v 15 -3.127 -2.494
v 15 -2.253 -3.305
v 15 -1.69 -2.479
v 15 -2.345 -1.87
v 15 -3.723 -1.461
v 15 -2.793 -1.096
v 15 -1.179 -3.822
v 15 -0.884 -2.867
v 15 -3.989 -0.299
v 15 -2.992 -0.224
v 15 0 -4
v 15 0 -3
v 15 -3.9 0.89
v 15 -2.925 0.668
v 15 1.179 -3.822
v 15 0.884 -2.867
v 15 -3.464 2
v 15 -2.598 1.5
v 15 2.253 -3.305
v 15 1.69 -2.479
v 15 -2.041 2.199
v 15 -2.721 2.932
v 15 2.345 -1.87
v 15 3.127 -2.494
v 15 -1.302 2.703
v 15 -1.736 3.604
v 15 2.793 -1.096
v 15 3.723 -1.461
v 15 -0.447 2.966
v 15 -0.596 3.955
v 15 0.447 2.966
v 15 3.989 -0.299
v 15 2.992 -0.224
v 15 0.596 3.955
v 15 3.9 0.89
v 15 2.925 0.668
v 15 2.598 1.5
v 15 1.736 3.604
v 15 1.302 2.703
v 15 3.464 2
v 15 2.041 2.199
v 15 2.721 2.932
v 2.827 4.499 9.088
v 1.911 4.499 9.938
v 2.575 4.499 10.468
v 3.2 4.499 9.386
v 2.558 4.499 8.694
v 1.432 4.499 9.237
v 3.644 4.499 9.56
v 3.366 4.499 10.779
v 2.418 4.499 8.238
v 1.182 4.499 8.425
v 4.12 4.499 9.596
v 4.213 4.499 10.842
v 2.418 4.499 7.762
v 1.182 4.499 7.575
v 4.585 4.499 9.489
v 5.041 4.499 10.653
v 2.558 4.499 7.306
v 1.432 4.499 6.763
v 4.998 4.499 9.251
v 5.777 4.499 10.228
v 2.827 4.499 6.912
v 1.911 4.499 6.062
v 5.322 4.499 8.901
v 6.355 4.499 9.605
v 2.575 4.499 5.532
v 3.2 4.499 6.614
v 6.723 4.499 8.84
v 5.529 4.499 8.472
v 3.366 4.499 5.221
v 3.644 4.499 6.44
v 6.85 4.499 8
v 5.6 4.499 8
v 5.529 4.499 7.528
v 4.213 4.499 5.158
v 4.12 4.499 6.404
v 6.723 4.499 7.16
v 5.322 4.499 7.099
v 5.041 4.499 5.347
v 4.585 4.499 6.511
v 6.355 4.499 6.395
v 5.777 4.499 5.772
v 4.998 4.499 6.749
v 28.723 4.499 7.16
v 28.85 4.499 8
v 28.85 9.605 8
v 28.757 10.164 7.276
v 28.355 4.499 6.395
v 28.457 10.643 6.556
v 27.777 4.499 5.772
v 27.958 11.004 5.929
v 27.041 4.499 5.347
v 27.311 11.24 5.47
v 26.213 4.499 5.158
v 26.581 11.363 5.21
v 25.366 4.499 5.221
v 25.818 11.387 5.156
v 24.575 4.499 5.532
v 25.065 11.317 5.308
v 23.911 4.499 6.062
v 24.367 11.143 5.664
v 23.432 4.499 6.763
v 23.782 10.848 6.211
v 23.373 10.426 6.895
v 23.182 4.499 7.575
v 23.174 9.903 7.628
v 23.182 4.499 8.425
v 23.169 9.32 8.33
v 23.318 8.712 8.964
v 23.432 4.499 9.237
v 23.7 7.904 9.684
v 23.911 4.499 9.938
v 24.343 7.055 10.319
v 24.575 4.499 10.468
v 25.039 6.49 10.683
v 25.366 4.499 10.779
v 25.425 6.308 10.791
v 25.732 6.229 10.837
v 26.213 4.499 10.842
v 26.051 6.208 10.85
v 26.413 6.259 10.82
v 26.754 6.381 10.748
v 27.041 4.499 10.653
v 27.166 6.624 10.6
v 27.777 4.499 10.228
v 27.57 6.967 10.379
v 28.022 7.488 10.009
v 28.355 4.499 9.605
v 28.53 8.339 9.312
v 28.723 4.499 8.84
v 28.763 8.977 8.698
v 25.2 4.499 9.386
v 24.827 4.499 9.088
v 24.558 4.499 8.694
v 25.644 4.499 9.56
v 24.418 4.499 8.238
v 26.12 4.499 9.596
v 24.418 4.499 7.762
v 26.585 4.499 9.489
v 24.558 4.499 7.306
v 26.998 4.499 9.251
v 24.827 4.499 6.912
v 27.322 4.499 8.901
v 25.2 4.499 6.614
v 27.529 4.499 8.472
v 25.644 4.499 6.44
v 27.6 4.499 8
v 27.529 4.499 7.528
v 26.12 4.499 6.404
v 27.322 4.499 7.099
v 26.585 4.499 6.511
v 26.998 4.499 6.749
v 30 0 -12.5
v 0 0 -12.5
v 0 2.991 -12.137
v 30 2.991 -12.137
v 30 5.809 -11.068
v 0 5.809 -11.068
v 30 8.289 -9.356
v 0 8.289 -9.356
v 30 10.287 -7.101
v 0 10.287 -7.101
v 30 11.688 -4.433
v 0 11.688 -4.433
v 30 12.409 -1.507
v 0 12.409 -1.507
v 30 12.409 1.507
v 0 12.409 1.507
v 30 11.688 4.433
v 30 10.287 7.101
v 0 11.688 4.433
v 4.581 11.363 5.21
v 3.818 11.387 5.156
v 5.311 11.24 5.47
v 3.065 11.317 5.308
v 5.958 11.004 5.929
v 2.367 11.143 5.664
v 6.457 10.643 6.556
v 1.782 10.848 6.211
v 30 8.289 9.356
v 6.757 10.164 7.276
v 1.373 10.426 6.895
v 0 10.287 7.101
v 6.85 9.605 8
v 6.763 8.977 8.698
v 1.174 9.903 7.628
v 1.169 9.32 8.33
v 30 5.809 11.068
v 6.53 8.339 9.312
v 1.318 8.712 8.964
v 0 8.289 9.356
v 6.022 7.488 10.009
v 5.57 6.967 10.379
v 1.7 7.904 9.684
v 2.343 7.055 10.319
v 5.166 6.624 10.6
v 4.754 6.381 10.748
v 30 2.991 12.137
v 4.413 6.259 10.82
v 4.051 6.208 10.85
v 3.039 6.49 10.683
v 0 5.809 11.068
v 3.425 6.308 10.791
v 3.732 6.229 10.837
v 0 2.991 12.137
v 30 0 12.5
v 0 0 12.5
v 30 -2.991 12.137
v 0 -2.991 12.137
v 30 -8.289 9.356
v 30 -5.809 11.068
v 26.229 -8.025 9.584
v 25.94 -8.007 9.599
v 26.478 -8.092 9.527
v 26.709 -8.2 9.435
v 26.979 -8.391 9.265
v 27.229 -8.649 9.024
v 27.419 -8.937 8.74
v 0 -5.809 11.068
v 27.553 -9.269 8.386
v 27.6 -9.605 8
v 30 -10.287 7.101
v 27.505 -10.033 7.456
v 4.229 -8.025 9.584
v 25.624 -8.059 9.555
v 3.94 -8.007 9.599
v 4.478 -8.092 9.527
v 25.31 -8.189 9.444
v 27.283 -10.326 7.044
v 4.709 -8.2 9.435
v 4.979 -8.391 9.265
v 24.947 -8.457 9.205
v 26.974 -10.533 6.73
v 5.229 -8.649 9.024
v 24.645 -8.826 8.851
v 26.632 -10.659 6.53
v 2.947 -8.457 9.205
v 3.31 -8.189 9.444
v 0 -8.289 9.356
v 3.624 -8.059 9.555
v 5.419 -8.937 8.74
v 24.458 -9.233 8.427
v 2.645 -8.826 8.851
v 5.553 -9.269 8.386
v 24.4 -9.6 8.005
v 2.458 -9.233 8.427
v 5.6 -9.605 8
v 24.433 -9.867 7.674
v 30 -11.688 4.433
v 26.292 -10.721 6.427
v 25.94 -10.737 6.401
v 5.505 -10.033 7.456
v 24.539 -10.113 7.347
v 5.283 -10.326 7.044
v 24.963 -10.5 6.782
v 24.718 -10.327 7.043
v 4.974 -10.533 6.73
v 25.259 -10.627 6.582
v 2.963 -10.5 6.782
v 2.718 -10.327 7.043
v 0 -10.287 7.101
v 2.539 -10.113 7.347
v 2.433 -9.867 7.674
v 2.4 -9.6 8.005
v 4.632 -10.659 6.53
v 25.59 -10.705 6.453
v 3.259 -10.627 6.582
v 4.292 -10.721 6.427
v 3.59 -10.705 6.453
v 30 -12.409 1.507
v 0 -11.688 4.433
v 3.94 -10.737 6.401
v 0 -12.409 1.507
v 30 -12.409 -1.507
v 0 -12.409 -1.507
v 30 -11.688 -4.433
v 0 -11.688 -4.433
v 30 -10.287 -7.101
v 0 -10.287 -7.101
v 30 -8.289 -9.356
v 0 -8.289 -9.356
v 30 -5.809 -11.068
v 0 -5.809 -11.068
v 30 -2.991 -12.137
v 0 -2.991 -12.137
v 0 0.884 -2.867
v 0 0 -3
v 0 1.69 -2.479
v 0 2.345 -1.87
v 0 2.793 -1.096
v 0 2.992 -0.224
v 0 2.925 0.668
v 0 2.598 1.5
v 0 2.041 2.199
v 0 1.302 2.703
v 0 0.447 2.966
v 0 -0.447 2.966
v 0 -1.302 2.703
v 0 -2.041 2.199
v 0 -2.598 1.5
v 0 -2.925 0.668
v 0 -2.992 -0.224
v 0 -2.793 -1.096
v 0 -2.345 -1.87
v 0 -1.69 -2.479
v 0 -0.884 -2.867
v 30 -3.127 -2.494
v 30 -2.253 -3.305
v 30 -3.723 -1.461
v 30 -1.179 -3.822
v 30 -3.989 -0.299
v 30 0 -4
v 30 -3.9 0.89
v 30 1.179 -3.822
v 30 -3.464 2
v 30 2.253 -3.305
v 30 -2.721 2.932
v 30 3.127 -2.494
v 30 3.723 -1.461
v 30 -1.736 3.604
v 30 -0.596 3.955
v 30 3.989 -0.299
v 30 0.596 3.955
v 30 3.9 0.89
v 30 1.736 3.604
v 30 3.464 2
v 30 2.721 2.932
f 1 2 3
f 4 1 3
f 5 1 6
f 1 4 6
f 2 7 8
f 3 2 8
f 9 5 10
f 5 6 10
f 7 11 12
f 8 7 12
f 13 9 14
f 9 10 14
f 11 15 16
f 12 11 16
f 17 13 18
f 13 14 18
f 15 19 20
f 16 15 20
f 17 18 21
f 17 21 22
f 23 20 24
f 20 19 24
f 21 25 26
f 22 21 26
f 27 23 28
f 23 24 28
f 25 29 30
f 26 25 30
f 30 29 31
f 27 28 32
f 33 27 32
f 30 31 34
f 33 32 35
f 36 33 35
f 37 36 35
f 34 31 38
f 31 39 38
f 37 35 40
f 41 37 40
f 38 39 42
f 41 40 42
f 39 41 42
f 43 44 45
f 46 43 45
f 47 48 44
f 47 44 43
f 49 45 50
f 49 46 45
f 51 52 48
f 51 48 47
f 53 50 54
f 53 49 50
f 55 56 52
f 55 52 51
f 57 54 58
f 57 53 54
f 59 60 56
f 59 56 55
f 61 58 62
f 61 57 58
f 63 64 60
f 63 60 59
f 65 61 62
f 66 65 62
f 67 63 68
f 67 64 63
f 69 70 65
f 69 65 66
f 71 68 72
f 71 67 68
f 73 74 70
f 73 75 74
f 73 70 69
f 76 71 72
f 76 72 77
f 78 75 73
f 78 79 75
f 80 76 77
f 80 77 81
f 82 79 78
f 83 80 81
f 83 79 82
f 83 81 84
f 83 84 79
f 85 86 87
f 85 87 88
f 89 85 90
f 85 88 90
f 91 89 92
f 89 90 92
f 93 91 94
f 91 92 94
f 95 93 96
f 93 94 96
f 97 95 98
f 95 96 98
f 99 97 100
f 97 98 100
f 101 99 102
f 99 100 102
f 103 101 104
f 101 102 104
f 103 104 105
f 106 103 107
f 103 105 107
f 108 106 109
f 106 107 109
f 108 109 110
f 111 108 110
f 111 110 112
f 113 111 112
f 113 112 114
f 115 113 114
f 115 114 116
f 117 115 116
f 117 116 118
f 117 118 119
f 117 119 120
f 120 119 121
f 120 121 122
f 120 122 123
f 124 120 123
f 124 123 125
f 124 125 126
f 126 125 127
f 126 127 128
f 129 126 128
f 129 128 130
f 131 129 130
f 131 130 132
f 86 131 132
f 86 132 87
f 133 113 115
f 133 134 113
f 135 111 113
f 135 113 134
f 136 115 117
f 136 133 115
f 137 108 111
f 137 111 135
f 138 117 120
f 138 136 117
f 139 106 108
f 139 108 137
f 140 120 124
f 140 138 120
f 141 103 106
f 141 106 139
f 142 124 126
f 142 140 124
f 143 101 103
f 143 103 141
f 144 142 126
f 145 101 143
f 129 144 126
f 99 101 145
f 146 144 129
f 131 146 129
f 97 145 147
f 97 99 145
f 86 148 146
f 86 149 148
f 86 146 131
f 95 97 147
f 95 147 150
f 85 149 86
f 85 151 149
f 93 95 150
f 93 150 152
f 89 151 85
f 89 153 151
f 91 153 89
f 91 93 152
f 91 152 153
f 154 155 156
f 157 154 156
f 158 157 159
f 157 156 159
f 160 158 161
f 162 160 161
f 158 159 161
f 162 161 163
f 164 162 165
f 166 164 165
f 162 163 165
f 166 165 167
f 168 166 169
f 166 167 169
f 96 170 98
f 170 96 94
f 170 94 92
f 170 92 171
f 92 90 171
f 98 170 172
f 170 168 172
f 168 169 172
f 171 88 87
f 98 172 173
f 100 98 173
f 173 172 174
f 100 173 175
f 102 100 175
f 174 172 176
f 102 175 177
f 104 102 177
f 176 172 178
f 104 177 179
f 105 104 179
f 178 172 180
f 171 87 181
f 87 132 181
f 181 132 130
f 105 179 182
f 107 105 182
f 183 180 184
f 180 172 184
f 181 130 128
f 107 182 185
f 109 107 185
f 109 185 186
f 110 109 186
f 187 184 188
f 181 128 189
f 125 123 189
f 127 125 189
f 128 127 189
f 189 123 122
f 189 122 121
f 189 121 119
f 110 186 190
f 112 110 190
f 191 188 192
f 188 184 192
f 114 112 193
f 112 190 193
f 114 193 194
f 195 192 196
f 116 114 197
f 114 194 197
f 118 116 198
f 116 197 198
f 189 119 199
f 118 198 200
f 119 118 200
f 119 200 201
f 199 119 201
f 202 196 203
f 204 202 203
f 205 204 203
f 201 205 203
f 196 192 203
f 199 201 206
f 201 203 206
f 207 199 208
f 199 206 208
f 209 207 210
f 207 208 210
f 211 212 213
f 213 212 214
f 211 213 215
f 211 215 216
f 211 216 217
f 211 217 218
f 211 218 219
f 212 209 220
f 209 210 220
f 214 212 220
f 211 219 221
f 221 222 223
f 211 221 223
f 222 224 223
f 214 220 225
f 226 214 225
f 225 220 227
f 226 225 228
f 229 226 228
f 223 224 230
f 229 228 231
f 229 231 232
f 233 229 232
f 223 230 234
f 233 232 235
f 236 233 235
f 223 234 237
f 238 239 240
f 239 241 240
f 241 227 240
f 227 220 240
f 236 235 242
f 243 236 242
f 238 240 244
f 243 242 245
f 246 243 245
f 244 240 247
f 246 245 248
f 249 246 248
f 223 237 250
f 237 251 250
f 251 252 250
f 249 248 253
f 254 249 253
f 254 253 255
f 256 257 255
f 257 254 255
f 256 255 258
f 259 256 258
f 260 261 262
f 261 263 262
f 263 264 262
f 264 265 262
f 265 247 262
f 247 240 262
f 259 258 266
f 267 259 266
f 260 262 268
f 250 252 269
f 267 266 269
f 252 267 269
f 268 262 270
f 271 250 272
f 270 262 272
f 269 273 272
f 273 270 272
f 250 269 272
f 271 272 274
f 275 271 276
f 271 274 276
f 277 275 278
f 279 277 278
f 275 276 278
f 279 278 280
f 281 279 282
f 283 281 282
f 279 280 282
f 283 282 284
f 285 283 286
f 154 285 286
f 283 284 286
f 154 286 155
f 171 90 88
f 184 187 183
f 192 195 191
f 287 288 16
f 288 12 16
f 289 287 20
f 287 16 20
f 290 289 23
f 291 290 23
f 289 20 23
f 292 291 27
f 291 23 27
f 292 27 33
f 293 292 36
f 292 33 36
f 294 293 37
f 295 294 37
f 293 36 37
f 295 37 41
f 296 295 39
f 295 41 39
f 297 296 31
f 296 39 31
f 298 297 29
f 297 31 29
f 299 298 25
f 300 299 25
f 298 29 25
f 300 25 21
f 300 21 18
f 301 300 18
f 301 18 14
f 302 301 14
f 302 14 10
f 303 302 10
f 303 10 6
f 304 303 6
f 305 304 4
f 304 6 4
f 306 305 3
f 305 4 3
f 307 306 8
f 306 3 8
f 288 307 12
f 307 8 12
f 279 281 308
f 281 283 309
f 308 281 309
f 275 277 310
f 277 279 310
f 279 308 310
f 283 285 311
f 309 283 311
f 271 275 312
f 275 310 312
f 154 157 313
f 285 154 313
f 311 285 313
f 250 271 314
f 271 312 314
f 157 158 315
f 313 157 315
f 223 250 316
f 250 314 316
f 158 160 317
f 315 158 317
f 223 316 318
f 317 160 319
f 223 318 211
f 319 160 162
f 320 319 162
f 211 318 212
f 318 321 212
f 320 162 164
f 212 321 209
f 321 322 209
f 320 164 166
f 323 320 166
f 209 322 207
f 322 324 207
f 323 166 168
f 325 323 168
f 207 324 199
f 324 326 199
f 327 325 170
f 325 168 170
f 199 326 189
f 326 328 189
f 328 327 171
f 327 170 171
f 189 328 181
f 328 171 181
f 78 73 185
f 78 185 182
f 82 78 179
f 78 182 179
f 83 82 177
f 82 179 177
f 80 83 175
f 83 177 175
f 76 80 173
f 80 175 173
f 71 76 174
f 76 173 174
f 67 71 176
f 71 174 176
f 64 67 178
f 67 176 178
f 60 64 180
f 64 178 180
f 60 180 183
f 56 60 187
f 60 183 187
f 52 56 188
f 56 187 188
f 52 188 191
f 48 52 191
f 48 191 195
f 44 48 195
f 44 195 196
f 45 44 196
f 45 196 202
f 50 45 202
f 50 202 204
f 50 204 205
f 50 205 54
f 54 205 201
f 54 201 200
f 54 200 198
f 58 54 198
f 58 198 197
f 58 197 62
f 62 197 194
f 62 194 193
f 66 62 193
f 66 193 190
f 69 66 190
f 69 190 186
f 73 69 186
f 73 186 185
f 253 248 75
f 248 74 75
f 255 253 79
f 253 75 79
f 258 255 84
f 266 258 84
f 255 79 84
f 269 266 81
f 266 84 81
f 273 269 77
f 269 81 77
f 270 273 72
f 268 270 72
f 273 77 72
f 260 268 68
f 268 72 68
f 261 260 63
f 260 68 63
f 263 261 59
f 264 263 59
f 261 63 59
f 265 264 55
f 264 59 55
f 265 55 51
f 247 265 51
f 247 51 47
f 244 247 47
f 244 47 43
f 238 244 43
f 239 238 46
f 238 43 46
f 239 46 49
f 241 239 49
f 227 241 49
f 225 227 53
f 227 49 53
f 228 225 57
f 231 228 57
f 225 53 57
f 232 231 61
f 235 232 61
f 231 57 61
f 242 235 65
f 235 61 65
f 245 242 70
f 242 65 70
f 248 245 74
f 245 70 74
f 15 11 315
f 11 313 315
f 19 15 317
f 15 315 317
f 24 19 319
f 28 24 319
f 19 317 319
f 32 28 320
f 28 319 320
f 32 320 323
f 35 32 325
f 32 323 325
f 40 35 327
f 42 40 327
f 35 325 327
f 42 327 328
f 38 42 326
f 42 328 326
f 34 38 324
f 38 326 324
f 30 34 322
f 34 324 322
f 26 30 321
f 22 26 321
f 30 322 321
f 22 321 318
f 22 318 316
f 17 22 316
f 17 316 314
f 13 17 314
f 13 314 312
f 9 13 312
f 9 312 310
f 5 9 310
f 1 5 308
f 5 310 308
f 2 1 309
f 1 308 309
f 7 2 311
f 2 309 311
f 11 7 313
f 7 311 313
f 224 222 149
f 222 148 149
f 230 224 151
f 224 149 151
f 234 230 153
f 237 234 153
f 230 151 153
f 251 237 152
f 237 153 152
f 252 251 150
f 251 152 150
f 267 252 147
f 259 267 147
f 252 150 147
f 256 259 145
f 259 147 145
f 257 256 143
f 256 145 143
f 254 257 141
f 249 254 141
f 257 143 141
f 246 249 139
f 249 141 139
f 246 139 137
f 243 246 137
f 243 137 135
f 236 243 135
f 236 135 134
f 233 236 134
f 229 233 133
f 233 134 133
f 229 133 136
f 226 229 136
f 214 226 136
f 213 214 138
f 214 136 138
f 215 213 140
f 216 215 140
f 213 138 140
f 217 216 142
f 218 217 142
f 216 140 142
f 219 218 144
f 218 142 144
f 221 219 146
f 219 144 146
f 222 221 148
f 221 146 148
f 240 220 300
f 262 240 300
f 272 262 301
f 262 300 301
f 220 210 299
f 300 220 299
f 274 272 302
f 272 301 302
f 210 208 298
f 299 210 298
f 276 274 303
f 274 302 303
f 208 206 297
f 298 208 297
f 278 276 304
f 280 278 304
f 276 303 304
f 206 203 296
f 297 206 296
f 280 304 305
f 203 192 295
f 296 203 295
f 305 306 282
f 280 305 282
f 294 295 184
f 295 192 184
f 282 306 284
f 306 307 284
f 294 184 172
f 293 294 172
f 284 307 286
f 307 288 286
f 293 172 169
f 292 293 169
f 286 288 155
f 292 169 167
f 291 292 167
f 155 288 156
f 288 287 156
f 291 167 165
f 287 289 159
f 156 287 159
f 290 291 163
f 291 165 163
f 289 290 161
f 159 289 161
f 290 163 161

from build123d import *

# Parameters (mm, degrees)
SKETCH_2_R                = 1.6
CUT_EXTRUDE_M3_DEPTH      = 13.5
CUT_EXTRUDE_M3_DEPTH_BACK = 13.5
SKETCH_3_R                = 2.85
CUT_EXTRUDE_993_DEPTH     = 8


with BuildPart() as part:
    # 草图1 → Revolve 643 (revolve)
    with BuildSketch(Plane(origin=(0, 0, 0), x_dir=(1, 0, 0), z_dir=(0, 1, 0))):
        Polygon((0, 12.5), (0, 3), (15, 3), (15, 4), (30, 4), (30, 12.5), align=None)
    revolve(axis=Axis((-118.9426696, 0, 0), (1, 0, 0)))

    # 草图2 → M3孔 (cut, two sides)
    with BuildSketch(Plane(origin=(0, 0, 0), x_dir=(1, 0, 0), z_dir=(0, 1, 0))) as cut_extrude_m3_sk:
        with Locations((4, -8)):
            Circle(SKETCH_2_R)
        with Locations((26, -8)):
            Circle(SKETCH_2_R)
    extrude(amount=CUT_EXTRUDE_M3_DEPTH, mode=Mode.SUBTRACT)
    extrude(cut_extrude_m3_sk.sketch, amount=-CUT_EXTRUDE_M3_DEPTH_BACK, mode=Mode.SUBTRACT)

    # 草图3 → Cut-Extrude 993 (cut)
    with BuildSketch(Plane(origin=(0, 12.499395806, 0), x_dir=(1, 0, 0), z_dir=(0, 1, 0))):
        with Locations((4, -8)):
            Circle(SKETCH_3_R)
        with Locations((26, -8)):
            Circle(SKETCH_3_R)
    extrude(amount=-CUT_EXTRUDE_993_DEPTH, mode=Mode.SUBTRACT)


solid = part.part
